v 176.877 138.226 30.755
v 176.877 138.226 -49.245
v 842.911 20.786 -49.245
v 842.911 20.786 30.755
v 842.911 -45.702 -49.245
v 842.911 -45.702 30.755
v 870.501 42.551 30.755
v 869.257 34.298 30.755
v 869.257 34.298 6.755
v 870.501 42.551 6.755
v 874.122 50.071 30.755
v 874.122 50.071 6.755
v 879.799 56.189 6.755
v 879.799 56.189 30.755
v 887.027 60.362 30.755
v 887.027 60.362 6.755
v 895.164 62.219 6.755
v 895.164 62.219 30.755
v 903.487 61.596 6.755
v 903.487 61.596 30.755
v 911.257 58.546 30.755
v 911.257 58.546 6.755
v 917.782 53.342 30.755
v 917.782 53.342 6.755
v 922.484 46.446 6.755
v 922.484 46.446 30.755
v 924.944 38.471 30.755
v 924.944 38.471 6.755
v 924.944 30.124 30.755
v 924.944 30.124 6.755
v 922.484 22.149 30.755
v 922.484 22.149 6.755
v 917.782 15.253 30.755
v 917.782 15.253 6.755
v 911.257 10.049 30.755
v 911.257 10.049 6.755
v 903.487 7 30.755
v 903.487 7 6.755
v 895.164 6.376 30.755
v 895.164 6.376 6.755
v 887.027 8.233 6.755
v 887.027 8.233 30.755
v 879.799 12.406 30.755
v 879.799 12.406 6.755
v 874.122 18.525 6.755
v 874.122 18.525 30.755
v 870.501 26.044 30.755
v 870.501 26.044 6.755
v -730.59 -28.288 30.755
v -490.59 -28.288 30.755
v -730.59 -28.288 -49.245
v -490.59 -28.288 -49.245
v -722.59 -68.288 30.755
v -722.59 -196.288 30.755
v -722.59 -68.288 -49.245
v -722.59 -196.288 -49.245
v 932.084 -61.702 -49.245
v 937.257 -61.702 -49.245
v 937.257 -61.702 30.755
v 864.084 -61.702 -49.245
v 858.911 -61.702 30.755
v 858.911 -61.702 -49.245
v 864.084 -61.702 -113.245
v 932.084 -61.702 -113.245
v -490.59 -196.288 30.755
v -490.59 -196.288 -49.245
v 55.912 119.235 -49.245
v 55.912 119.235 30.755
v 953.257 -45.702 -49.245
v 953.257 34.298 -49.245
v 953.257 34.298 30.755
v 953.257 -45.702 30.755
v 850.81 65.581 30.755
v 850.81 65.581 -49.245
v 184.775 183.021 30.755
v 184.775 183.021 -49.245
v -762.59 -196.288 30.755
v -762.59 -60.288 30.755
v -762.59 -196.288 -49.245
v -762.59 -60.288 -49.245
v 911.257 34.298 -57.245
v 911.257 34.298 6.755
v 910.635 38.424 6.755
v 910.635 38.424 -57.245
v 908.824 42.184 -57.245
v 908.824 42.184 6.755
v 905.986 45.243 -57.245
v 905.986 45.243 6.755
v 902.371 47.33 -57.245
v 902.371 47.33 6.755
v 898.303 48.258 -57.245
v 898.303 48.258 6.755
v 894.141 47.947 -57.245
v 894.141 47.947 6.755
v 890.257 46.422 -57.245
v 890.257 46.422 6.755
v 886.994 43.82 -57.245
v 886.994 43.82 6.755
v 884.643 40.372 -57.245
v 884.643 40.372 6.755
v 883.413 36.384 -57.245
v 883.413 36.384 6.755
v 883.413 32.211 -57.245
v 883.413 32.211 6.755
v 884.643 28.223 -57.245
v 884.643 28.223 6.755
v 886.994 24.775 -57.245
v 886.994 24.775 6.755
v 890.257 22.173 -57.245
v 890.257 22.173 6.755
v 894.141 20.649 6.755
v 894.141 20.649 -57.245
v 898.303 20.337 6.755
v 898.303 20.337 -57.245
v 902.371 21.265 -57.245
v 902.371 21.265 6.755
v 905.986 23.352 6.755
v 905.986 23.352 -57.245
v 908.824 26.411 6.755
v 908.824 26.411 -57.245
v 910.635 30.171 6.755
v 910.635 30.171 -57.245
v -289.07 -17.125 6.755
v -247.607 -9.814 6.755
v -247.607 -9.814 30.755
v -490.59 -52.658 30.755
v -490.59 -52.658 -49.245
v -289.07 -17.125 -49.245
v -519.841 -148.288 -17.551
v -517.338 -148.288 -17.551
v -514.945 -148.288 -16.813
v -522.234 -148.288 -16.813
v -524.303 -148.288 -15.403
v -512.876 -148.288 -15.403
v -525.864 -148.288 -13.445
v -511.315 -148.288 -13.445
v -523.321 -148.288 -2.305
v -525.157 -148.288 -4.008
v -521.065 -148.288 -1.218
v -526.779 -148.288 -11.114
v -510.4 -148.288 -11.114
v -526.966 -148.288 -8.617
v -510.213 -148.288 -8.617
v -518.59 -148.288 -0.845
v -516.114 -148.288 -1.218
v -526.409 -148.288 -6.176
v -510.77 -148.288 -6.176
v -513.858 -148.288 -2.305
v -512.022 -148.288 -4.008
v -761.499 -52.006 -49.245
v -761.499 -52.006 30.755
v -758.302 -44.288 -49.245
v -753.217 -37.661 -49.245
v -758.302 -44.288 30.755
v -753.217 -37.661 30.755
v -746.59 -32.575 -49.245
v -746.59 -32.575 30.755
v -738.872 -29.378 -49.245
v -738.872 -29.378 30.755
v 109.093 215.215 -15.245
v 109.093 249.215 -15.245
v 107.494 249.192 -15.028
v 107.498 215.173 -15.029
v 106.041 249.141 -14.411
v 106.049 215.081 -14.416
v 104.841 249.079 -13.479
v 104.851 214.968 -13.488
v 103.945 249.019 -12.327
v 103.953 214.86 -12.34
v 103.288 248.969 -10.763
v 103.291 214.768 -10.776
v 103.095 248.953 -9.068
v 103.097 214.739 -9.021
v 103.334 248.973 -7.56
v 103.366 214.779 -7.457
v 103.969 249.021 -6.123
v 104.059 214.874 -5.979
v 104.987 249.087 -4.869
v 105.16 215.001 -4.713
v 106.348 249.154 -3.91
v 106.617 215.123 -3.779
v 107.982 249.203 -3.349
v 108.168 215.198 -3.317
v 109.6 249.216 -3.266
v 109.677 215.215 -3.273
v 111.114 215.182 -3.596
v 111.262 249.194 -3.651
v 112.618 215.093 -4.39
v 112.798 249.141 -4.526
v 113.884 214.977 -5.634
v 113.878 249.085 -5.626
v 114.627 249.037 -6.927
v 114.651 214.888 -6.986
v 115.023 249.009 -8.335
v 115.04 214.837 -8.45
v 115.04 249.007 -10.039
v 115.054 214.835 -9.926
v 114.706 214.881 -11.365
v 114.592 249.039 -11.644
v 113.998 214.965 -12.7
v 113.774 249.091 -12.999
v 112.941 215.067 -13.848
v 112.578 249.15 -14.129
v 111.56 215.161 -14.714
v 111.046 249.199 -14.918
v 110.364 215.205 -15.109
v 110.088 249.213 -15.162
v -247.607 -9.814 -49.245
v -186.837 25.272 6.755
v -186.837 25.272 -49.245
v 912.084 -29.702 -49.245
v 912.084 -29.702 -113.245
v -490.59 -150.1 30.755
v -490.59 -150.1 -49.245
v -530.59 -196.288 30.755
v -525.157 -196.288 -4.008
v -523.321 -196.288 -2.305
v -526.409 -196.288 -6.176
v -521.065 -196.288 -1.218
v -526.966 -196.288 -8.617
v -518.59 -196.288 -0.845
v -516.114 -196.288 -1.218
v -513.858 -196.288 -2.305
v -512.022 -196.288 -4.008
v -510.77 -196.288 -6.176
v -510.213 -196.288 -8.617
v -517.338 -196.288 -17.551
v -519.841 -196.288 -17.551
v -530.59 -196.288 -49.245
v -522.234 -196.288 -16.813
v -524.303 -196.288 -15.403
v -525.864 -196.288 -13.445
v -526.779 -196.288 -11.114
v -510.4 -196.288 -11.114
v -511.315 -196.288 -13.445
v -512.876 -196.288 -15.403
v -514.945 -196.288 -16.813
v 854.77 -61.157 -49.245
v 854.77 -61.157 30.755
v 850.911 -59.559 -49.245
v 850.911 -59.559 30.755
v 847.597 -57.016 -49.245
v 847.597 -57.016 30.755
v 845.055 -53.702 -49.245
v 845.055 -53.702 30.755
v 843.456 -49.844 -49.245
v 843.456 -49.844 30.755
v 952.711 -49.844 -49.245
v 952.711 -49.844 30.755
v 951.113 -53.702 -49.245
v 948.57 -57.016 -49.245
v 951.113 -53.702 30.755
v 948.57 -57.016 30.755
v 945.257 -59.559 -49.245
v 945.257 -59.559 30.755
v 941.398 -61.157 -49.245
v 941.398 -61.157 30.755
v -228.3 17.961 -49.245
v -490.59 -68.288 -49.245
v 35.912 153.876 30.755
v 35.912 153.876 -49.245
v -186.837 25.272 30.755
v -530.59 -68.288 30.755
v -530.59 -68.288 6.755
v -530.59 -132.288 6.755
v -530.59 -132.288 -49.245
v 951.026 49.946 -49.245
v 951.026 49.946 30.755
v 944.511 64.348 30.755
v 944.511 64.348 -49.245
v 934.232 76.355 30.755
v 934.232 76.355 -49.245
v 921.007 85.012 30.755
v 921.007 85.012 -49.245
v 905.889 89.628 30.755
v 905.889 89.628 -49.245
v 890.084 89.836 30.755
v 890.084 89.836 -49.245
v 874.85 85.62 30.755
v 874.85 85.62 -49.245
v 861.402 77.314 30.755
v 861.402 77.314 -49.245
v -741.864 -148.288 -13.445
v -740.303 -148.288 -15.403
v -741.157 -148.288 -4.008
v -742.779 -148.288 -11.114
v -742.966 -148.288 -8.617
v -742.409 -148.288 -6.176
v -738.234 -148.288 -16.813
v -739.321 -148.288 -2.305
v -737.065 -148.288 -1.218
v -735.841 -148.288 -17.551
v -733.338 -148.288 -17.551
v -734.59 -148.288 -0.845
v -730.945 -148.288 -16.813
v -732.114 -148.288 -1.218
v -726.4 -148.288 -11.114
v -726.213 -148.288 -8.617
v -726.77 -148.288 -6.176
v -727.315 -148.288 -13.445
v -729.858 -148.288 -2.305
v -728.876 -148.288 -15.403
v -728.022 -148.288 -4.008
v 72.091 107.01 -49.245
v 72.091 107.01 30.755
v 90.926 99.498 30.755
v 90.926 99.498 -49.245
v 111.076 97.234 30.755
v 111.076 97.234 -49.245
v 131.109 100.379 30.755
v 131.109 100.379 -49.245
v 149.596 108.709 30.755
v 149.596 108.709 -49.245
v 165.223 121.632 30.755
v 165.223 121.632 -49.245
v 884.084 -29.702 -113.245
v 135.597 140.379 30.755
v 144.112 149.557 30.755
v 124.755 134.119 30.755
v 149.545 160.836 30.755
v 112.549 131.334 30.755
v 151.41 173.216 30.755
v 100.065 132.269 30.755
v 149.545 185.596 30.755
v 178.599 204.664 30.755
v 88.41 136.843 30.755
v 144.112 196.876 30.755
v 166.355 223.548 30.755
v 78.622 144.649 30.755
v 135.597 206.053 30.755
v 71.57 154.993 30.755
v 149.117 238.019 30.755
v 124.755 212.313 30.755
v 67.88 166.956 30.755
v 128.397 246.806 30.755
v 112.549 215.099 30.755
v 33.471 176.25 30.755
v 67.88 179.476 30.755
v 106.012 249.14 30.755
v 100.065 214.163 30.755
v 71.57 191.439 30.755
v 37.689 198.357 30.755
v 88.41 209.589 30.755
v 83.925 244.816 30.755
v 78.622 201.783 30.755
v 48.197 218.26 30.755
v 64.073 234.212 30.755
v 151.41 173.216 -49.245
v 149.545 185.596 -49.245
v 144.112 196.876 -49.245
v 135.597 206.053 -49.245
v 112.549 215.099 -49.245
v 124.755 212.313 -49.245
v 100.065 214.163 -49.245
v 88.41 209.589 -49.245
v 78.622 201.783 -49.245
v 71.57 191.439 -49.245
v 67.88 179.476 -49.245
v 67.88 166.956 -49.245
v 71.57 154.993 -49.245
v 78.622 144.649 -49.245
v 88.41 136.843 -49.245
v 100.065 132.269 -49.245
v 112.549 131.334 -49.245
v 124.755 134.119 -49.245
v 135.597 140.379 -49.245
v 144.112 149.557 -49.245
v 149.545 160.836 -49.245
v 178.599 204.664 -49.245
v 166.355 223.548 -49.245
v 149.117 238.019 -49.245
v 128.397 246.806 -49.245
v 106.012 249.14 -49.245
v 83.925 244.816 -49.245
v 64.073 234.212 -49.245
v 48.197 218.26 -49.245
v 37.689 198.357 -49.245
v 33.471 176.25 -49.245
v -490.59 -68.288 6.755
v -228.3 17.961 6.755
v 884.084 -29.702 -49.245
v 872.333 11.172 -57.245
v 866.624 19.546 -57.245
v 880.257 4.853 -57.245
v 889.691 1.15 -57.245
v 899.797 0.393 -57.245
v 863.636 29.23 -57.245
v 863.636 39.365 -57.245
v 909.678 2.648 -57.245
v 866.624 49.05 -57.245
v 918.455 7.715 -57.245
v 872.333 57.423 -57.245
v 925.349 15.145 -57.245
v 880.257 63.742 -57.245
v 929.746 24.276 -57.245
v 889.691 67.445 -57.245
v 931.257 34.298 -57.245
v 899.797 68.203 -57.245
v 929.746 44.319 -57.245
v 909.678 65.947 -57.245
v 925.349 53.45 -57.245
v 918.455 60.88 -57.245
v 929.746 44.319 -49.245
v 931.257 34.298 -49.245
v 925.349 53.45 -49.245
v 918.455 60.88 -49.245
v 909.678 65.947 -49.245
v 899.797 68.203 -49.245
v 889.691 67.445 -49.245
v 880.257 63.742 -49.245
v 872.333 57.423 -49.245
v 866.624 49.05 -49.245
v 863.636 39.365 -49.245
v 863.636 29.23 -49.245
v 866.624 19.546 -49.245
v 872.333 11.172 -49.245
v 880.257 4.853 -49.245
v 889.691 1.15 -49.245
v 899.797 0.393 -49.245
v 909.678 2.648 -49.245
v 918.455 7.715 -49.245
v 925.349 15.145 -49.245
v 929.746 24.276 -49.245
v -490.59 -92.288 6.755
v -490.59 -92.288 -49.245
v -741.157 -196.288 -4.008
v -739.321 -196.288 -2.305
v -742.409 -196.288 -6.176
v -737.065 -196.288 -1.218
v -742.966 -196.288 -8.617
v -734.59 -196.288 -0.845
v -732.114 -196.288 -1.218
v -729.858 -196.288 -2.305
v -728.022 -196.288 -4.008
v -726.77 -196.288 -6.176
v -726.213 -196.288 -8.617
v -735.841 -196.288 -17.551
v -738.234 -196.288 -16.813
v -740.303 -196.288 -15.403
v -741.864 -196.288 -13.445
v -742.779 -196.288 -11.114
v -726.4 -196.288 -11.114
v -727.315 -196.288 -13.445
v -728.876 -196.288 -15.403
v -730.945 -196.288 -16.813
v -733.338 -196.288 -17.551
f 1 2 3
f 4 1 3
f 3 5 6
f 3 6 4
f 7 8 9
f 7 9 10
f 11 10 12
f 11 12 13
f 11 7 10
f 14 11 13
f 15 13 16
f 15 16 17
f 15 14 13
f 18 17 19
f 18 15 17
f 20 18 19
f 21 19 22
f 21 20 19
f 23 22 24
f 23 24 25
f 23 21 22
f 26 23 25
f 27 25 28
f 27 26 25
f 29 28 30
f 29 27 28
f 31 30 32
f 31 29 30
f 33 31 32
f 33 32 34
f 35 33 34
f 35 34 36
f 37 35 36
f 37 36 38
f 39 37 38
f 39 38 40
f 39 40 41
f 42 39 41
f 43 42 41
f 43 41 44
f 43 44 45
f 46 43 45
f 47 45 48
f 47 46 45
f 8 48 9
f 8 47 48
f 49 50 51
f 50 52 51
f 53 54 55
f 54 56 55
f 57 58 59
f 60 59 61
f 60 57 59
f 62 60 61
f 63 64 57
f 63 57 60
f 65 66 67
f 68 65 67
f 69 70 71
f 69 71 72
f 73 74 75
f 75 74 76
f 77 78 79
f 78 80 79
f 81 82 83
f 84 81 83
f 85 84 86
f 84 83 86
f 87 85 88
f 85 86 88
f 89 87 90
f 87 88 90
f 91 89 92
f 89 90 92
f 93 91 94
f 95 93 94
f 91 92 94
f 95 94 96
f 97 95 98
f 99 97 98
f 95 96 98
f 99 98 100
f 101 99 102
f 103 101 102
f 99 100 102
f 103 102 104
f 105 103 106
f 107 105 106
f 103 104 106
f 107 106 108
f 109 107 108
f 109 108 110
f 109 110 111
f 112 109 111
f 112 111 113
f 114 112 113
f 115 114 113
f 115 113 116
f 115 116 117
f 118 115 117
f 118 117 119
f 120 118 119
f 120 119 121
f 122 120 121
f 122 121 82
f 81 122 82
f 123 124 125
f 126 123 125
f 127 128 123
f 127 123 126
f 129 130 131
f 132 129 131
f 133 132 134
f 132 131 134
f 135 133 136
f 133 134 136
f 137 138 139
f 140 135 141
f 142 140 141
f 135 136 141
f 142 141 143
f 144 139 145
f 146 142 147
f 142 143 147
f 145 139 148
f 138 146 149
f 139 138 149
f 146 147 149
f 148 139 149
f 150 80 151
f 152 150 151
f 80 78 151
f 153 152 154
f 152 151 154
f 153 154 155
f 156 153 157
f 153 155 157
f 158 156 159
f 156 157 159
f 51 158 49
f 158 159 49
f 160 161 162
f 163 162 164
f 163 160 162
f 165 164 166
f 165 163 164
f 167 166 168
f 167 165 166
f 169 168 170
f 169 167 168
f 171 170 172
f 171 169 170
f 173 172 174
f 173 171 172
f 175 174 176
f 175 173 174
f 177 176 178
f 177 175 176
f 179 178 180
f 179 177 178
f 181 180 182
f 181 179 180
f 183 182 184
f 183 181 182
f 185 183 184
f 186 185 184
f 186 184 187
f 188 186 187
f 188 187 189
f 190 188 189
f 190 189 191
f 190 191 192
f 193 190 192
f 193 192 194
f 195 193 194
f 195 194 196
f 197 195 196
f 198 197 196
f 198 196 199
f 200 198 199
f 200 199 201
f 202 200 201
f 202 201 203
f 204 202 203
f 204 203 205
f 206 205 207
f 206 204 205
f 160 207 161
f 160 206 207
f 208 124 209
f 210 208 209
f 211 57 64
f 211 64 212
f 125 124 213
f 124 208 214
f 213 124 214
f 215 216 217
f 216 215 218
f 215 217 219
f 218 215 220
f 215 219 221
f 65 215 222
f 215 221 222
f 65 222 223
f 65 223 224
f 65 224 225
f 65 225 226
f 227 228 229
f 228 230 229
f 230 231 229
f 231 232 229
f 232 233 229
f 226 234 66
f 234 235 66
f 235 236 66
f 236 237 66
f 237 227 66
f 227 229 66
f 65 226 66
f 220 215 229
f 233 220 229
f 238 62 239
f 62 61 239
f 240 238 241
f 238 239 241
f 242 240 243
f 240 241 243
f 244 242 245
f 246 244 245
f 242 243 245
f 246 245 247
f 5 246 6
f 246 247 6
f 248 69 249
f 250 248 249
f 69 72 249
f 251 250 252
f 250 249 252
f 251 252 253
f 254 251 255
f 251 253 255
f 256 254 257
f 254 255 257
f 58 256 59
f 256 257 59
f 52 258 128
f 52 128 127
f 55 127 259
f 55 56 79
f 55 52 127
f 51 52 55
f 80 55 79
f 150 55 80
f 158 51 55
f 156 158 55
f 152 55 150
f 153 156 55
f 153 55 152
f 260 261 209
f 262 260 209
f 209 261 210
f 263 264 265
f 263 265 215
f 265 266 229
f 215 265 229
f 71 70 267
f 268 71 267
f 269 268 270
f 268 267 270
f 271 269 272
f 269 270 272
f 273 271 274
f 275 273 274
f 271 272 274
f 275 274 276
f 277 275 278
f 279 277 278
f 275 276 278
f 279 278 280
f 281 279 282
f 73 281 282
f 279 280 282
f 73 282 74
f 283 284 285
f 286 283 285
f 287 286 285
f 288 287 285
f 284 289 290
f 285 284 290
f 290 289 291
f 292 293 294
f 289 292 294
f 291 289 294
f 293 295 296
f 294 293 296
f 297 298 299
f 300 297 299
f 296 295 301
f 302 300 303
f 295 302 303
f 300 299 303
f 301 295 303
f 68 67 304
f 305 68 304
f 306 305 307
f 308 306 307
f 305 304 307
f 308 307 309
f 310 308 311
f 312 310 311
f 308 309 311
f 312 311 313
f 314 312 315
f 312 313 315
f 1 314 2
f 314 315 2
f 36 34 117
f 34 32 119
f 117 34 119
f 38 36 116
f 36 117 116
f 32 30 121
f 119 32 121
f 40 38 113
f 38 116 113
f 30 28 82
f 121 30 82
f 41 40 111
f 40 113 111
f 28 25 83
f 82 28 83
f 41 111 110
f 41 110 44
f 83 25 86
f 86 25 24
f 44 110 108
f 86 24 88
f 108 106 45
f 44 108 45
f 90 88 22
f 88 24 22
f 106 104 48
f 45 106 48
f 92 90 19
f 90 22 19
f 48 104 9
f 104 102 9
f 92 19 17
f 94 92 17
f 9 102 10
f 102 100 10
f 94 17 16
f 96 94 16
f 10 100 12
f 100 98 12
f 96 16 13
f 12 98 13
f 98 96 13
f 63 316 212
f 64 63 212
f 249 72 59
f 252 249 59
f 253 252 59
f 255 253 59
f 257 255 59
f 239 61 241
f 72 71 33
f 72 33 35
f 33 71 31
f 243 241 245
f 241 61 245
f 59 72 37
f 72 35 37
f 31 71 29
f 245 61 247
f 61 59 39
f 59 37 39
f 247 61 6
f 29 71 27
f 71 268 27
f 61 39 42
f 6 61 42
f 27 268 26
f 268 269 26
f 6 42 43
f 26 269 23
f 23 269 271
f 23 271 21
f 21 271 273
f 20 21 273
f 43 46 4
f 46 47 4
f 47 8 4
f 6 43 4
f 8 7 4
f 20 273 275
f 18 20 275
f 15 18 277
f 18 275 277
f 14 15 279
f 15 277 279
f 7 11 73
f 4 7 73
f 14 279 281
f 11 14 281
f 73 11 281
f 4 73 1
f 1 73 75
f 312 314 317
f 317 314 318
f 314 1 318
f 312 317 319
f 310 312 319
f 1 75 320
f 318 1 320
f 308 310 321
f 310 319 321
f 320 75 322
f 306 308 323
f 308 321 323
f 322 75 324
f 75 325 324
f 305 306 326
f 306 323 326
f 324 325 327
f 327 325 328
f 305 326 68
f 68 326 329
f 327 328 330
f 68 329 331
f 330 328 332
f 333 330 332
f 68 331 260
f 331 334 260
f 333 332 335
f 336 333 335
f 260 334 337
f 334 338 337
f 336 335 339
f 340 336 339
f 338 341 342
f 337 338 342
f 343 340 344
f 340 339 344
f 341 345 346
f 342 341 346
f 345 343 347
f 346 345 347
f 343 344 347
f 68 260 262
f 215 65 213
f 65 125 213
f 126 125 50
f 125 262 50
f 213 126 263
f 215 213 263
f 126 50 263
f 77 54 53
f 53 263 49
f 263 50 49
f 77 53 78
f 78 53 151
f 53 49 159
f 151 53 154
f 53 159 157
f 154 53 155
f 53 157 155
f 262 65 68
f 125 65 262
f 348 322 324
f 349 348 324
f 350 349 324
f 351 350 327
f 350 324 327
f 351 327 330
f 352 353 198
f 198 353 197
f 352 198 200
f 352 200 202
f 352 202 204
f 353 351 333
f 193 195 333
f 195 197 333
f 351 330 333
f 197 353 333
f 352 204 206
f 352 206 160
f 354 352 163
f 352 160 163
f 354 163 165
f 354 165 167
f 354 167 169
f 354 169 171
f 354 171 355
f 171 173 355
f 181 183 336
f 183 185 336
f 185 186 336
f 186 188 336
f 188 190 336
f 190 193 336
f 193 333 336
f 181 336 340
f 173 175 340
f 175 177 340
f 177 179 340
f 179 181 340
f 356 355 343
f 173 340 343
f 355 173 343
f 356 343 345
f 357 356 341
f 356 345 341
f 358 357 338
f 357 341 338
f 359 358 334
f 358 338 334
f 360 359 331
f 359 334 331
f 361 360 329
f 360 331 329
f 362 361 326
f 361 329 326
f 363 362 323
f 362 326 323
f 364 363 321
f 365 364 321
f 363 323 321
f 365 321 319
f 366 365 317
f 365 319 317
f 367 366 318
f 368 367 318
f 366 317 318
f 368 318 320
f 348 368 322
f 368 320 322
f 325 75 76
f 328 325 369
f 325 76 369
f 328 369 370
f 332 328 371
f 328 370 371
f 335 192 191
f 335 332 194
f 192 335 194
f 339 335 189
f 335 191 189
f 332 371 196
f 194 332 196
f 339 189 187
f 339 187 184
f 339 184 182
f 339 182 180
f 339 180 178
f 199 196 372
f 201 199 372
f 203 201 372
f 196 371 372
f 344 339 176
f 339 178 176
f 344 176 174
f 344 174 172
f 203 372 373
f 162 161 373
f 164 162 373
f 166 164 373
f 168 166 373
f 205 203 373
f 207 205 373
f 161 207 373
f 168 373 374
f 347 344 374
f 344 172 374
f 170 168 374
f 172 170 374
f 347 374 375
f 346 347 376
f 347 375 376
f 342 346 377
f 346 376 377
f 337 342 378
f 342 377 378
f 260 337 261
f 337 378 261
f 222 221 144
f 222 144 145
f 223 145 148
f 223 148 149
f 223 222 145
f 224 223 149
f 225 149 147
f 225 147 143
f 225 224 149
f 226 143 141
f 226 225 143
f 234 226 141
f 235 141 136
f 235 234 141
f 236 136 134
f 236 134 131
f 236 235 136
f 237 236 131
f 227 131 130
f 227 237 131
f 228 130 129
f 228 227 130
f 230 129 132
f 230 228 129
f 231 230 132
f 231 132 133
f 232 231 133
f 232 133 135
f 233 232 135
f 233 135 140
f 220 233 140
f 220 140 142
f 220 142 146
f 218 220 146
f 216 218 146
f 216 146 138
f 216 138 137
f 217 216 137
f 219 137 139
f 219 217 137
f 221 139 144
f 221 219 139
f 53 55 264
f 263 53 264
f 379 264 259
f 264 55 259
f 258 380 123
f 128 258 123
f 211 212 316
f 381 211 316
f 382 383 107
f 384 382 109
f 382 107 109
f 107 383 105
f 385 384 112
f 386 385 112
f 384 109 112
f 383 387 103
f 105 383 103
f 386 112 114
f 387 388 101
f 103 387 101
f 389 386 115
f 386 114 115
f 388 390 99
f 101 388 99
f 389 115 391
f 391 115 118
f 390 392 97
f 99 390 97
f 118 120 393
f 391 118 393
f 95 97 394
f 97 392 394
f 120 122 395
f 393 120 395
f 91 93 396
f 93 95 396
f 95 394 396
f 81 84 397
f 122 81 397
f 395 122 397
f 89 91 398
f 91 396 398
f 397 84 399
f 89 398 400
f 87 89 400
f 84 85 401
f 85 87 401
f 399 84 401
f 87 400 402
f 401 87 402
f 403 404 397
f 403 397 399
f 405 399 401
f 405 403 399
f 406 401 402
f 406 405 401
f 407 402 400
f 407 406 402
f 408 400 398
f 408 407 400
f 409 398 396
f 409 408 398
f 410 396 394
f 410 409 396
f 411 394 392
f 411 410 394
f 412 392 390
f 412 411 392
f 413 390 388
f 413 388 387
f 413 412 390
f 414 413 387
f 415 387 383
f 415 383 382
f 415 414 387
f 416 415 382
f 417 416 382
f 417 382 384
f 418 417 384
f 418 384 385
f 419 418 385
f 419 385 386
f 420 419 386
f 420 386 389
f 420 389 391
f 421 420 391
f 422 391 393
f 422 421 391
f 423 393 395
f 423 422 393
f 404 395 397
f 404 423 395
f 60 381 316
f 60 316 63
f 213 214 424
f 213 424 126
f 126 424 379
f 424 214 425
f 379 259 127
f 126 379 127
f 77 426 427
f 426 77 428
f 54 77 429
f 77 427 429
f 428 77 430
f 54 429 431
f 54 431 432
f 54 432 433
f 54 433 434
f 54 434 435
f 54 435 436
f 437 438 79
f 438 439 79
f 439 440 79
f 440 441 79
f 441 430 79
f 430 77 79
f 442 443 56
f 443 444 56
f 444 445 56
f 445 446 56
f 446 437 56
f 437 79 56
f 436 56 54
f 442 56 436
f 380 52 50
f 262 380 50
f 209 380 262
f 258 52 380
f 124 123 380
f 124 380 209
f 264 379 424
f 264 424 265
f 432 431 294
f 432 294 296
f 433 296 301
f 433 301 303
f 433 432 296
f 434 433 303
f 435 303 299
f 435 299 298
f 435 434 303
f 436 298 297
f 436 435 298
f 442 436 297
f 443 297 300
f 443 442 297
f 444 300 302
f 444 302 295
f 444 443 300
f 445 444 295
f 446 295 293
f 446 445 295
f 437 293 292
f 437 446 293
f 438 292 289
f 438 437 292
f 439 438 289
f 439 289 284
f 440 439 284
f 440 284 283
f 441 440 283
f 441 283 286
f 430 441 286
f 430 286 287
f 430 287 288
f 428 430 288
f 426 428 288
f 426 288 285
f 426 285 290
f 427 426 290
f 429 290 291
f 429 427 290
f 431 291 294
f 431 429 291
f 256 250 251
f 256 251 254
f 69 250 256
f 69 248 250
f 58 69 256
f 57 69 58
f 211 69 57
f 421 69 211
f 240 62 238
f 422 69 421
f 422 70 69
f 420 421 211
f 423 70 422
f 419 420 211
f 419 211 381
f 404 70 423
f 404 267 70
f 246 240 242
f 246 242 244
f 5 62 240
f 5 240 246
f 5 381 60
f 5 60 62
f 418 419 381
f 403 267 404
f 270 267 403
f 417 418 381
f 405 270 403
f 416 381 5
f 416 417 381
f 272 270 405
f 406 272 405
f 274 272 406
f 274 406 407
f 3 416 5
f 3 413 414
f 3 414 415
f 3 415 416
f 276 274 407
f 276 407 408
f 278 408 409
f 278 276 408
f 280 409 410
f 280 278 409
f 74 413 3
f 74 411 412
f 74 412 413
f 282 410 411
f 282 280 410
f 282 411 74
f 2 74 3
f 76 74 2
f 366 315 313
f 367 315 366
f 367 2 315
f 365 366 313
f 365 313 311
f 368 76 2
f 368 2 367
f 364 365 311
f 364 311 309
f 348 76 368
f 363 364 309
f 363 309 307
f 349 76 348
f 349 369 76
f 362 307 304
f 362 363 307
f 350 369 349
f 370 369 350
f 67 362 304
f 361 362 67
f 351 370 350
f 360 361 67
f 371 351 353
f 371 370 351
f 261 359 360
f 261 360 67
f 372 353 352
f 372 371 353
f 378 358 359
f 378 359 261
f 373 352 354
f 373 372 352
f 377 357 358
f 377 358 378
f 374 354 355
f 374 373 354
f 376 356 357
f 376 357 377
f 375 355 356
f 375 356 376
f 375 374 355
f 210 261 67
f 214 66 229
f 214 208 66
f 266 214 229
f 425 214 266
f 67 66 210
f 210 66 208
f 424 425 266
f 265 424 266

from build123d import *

# Parameters (mm, degrees)
SKICA1_R                 = 5.25
P_IDAT_VYSUNUT_M1_DEPTH  = 5
ZAOBLIT1_R               = 4
P_IDAT_VYSUNUT_M3_DEPTH  = 5
SKICA5_R                 = 4.25
SKICA5_R_2               = 1.75
P_IDAT_VYSUNUT_M4_DEPTH  = 1
SKICA8_R                 = 1.05
ODEBRAT_VYSUNUT_M3_DEPTH = 6
ODEBRAT_VYSUNUT_M4_DEPTH = 7
ODEBRAT_START            = -10
SKICA2_R                 = 1.75
ODEBRAT_VYSUNUT_M5_DEPTH = 10
SKICA10_R                = 3.5
ODEBRAT_VYSUNUT_M6_DEPTH = 3
ODEBRAT_START_2          = 50
SKICA11_R                = 0.75
ODEBRAT_VYSUNUT_M7_DEPTH = 10
P_IDAT_VYSUNUT_M5_DEPTH  = 10
P_IDAT_VYSUNUT_M6_DEPTH  = 8
ZAOBLIT2_R               = 2
ODEBRAT_START_3          = -7
ODEBRAT_VYSUNUT_M8_DEPTH = 7
SCALE1_SCALE             = 8


with BuildPart() as part:
    # Skica1 → Přidat vysunutím1 (new, symmetric)
    with BuildSketch(Plane.XY):
        with BuildLine():
            Line((0, 0), (0, 16))
            Line((0, 16), (24, 16))
            Line((24, 16), (24, 0))
            Line((24, 0), (29, 0))
            Line((29, 0), (97.312746067, 39.440382331))
            ThreePointArc((97.312746067, 39.440382331), (105.473420704, 36.802978572), (112.433277726, 41.81425579))
            Line((112.433277726, 41.81425579), (195.687578405, 27.134276321))
            ThreePointArc((195.687578405, 27.134276321), (209.374429572, 27.607666525), (196.674905514, 32.733686604))
            Line((196.674905514, 32.733686604), (113.420604835, 47.413666074))
            ThreePointArc((113.420604835, 47.413666074), (102.174688824, 55.511016714), (94.812746067, 43.77050935))
            Line((94.812746067, 43.77050935), (29, 5.773502692))
            Line((29, 5.773502692), (29, 21))
            Line((29, 21), (-5, 21))
            Line((-5, 21), (-5, 0))
            Line((-5, 0), (0, 0))
        make_face()
        with Locations((104, 46.188021535)):
            Circle(SKICA1_R, mode=Mode.SUBTRACT)
    extrude(amount=P_IDAT_VYSUNUT_M1_DEPTH, both=True)

    # Zaoblit1
    zaoblit1_edges = [part.edges().sort_by_distance(p)[0] for p in [
        (-5, 21, 0),
    ]]
    fillet(zaoblit1_edges, radius=ZAOBLIT1_R)

    # Skica4 → Přidat vysunutím3 (add, symmetric)
    with BuildSketch(Plane.XY):
        Polygon((29, 21), (66.969109888, 27.694978507), (59.37284323, 23.309271907), (29, 17.953720164), align=None)
    extrude(amount=P_IDAT_VYSUNUT_M3_DEPTH, both=True)

    # Skica5 → Přidat vysunutím4 (add)
    with BuildSketch(Plane.XY.offset(5)):
        with Locations((202.480775301, 28.823203768)):
            Circle(SKICA5_R)
        with Locations((202.480775301, 28.823203768)):
            Circle(SKICA5_R_2, mode=Mode.SUBTRACT)
    extrude(amount=P_IDAT_VYSUNUT_M4_DEPTH)

    # Skica8 → Odebrat vysunutím3 (cut)
    with BuildSketch(Plane.XZ):
        with Locations(Location((-1.5, 0, 0), (0, 0, 270))):
            Circle(SKICA8_R)
        with Locations(Location((25.5, 0, 0), (0, 0, 270))):
            Circle(SKICA8_R)
    extrude(amount=-ODEBRAT_VYSUNUT_M3_DEPTH, mode=Mode.SUBTRACT)

    # Skica9 → Odebrat vysunutím4 (cut)
    with BuildSketch(Plane.XY.offset(5)):
        Polygon((24, 16), (29, 16), (29, 13), (24, 8), align=None)
    extrude(amount=-ODEBRAT_VYSUNUT_M4_DEPTH, mode=Mode.SUBTRACT)

    # Skica2 → Odebrat vysunutím5 (cut)
    with BuildSketch(Plane.XY.offset(5).offset(ODEBRAT_START)):
        with Locations((202.480775301, 28.823203768)):
            Circle(SKICA2_R)
    extrude(amount=ODEBRAT_VYSUNUT_M5_DEPTH, mode=Mode.SUBTRACT)

    # Skica10 → Odebrat vysunutím6 (cut)
    with BuildSketch(Plane(origin=(0, 0, -5), x_dir=(-1, 0, 0), z_dir=(0, 0, -1))):
        with Locations((-202.480775301, 28.823203768)):
            Circle(SKICA10_R)
    extrude(amount=-ODEBRAT_VYSUNUT_M6_DEPTH, mode=Mode.SUBTRACT)


with BuildPart() as body_2:
    # Zrcadlit1: mirrored copy
    add(part.part.mirror(Plane(origin=(93.65445241, 28.310869093, -5), x_dir=(1, 0, 0), z_dir=(0, 0, -1))))

    # Skica11 → Odebrat vysunutím7 (cut)
    with BuildSketch(Plane(origin=(0, 0, 0), x_dir=(1, 0, 0), z_dir=(0, 1, 0)).offset(ODEBRAT_START_2)):
        with Locations(Location((103.960302418, 10, 0), (0, 0, 90))):
            Circle(SKICA11_R)
    extrude(amount=ODEBRAT_VYSUNUT_M7_DEPTH, mode=Mode.SUBTRACT)

    # Skica12 → Přidat vysunutím5 (add)
    with BuildSketch(Plane(origin=(0, 0, -15), x_dir=(-1, 0, 0), z_dir=(0, 0, -1))):
        with BuildLine():
            Line((-209.480775301, 28.823203768), (-209.480775301, 16.823203768))
            Line((-209.480775301, 16.823203768), (-195.687578405, 16.823203768))
            Line((-195.687578405, 16.823203768), (-195.687578405, 27.134276321))
            ThreePointArc((-195.687578405, 27.134276321), (-203.331546047, 21.875096894), (-209.480775301, 28.823203768))
        make_face()
    extrude(amount=-P_IDAT_VYSUNUT_M5_DEPTH)

    # Skica13 → Přidat vysunutím6 (add)
    with BuildSketch(Plane(origin=(0, 0, -15), x_dir=(-1, 0, 0), z_dir=(0, 0, -1))):
        Polygon((-204.334176853, 20.823203768), (-200.834176853, 20.823203768), (-198.334176853, 16.823203768), (-206.834176853, 16.823203768), align=None)
    extrude(amount=P_IDAT_VYSUNUT_M6_DEPTH)

    # Zaoblit2
    zaoblit2_edges = [body_2.edges().sort_by_distance(p)[0] for p in [
        (195.687578405, 16.823203768, -10),
        (209.480775301, 16.823203768, -10),
    ]]
    fillet(zaoblit2_edges, radius=ZAOBLIT2_R)

    # Skica14 → Odebrat vysunutím8 (cut)
    with BuildSketch(Plane(origin=(0, 0, -15), x_dir=(-1, 0, 0), z_dir=(0, 0, -1)).offset(ODEBRAT_START_3)):
        Polygon((-59.37284323, 23.309271907), (-66.969109888, 27.694978507), (-61.786216453, 26.781094556), (-54.189949795, 22.395387956), align=None)
    extrude(amount=ODEBRAT_VYSUNUT_M8_DEPTH, mode=Mode.SUBTRACT)


with BuildPart() as body_2_1:
    # Scale1: scaled about (103.22707652, 28.04115128, -10.107869414)
    add(body_2.part.scale(SCALE1_SCALE).moved(Location((-722.58953564, -196.28805896, 70.755085898))))


solid = body_2_1.part
